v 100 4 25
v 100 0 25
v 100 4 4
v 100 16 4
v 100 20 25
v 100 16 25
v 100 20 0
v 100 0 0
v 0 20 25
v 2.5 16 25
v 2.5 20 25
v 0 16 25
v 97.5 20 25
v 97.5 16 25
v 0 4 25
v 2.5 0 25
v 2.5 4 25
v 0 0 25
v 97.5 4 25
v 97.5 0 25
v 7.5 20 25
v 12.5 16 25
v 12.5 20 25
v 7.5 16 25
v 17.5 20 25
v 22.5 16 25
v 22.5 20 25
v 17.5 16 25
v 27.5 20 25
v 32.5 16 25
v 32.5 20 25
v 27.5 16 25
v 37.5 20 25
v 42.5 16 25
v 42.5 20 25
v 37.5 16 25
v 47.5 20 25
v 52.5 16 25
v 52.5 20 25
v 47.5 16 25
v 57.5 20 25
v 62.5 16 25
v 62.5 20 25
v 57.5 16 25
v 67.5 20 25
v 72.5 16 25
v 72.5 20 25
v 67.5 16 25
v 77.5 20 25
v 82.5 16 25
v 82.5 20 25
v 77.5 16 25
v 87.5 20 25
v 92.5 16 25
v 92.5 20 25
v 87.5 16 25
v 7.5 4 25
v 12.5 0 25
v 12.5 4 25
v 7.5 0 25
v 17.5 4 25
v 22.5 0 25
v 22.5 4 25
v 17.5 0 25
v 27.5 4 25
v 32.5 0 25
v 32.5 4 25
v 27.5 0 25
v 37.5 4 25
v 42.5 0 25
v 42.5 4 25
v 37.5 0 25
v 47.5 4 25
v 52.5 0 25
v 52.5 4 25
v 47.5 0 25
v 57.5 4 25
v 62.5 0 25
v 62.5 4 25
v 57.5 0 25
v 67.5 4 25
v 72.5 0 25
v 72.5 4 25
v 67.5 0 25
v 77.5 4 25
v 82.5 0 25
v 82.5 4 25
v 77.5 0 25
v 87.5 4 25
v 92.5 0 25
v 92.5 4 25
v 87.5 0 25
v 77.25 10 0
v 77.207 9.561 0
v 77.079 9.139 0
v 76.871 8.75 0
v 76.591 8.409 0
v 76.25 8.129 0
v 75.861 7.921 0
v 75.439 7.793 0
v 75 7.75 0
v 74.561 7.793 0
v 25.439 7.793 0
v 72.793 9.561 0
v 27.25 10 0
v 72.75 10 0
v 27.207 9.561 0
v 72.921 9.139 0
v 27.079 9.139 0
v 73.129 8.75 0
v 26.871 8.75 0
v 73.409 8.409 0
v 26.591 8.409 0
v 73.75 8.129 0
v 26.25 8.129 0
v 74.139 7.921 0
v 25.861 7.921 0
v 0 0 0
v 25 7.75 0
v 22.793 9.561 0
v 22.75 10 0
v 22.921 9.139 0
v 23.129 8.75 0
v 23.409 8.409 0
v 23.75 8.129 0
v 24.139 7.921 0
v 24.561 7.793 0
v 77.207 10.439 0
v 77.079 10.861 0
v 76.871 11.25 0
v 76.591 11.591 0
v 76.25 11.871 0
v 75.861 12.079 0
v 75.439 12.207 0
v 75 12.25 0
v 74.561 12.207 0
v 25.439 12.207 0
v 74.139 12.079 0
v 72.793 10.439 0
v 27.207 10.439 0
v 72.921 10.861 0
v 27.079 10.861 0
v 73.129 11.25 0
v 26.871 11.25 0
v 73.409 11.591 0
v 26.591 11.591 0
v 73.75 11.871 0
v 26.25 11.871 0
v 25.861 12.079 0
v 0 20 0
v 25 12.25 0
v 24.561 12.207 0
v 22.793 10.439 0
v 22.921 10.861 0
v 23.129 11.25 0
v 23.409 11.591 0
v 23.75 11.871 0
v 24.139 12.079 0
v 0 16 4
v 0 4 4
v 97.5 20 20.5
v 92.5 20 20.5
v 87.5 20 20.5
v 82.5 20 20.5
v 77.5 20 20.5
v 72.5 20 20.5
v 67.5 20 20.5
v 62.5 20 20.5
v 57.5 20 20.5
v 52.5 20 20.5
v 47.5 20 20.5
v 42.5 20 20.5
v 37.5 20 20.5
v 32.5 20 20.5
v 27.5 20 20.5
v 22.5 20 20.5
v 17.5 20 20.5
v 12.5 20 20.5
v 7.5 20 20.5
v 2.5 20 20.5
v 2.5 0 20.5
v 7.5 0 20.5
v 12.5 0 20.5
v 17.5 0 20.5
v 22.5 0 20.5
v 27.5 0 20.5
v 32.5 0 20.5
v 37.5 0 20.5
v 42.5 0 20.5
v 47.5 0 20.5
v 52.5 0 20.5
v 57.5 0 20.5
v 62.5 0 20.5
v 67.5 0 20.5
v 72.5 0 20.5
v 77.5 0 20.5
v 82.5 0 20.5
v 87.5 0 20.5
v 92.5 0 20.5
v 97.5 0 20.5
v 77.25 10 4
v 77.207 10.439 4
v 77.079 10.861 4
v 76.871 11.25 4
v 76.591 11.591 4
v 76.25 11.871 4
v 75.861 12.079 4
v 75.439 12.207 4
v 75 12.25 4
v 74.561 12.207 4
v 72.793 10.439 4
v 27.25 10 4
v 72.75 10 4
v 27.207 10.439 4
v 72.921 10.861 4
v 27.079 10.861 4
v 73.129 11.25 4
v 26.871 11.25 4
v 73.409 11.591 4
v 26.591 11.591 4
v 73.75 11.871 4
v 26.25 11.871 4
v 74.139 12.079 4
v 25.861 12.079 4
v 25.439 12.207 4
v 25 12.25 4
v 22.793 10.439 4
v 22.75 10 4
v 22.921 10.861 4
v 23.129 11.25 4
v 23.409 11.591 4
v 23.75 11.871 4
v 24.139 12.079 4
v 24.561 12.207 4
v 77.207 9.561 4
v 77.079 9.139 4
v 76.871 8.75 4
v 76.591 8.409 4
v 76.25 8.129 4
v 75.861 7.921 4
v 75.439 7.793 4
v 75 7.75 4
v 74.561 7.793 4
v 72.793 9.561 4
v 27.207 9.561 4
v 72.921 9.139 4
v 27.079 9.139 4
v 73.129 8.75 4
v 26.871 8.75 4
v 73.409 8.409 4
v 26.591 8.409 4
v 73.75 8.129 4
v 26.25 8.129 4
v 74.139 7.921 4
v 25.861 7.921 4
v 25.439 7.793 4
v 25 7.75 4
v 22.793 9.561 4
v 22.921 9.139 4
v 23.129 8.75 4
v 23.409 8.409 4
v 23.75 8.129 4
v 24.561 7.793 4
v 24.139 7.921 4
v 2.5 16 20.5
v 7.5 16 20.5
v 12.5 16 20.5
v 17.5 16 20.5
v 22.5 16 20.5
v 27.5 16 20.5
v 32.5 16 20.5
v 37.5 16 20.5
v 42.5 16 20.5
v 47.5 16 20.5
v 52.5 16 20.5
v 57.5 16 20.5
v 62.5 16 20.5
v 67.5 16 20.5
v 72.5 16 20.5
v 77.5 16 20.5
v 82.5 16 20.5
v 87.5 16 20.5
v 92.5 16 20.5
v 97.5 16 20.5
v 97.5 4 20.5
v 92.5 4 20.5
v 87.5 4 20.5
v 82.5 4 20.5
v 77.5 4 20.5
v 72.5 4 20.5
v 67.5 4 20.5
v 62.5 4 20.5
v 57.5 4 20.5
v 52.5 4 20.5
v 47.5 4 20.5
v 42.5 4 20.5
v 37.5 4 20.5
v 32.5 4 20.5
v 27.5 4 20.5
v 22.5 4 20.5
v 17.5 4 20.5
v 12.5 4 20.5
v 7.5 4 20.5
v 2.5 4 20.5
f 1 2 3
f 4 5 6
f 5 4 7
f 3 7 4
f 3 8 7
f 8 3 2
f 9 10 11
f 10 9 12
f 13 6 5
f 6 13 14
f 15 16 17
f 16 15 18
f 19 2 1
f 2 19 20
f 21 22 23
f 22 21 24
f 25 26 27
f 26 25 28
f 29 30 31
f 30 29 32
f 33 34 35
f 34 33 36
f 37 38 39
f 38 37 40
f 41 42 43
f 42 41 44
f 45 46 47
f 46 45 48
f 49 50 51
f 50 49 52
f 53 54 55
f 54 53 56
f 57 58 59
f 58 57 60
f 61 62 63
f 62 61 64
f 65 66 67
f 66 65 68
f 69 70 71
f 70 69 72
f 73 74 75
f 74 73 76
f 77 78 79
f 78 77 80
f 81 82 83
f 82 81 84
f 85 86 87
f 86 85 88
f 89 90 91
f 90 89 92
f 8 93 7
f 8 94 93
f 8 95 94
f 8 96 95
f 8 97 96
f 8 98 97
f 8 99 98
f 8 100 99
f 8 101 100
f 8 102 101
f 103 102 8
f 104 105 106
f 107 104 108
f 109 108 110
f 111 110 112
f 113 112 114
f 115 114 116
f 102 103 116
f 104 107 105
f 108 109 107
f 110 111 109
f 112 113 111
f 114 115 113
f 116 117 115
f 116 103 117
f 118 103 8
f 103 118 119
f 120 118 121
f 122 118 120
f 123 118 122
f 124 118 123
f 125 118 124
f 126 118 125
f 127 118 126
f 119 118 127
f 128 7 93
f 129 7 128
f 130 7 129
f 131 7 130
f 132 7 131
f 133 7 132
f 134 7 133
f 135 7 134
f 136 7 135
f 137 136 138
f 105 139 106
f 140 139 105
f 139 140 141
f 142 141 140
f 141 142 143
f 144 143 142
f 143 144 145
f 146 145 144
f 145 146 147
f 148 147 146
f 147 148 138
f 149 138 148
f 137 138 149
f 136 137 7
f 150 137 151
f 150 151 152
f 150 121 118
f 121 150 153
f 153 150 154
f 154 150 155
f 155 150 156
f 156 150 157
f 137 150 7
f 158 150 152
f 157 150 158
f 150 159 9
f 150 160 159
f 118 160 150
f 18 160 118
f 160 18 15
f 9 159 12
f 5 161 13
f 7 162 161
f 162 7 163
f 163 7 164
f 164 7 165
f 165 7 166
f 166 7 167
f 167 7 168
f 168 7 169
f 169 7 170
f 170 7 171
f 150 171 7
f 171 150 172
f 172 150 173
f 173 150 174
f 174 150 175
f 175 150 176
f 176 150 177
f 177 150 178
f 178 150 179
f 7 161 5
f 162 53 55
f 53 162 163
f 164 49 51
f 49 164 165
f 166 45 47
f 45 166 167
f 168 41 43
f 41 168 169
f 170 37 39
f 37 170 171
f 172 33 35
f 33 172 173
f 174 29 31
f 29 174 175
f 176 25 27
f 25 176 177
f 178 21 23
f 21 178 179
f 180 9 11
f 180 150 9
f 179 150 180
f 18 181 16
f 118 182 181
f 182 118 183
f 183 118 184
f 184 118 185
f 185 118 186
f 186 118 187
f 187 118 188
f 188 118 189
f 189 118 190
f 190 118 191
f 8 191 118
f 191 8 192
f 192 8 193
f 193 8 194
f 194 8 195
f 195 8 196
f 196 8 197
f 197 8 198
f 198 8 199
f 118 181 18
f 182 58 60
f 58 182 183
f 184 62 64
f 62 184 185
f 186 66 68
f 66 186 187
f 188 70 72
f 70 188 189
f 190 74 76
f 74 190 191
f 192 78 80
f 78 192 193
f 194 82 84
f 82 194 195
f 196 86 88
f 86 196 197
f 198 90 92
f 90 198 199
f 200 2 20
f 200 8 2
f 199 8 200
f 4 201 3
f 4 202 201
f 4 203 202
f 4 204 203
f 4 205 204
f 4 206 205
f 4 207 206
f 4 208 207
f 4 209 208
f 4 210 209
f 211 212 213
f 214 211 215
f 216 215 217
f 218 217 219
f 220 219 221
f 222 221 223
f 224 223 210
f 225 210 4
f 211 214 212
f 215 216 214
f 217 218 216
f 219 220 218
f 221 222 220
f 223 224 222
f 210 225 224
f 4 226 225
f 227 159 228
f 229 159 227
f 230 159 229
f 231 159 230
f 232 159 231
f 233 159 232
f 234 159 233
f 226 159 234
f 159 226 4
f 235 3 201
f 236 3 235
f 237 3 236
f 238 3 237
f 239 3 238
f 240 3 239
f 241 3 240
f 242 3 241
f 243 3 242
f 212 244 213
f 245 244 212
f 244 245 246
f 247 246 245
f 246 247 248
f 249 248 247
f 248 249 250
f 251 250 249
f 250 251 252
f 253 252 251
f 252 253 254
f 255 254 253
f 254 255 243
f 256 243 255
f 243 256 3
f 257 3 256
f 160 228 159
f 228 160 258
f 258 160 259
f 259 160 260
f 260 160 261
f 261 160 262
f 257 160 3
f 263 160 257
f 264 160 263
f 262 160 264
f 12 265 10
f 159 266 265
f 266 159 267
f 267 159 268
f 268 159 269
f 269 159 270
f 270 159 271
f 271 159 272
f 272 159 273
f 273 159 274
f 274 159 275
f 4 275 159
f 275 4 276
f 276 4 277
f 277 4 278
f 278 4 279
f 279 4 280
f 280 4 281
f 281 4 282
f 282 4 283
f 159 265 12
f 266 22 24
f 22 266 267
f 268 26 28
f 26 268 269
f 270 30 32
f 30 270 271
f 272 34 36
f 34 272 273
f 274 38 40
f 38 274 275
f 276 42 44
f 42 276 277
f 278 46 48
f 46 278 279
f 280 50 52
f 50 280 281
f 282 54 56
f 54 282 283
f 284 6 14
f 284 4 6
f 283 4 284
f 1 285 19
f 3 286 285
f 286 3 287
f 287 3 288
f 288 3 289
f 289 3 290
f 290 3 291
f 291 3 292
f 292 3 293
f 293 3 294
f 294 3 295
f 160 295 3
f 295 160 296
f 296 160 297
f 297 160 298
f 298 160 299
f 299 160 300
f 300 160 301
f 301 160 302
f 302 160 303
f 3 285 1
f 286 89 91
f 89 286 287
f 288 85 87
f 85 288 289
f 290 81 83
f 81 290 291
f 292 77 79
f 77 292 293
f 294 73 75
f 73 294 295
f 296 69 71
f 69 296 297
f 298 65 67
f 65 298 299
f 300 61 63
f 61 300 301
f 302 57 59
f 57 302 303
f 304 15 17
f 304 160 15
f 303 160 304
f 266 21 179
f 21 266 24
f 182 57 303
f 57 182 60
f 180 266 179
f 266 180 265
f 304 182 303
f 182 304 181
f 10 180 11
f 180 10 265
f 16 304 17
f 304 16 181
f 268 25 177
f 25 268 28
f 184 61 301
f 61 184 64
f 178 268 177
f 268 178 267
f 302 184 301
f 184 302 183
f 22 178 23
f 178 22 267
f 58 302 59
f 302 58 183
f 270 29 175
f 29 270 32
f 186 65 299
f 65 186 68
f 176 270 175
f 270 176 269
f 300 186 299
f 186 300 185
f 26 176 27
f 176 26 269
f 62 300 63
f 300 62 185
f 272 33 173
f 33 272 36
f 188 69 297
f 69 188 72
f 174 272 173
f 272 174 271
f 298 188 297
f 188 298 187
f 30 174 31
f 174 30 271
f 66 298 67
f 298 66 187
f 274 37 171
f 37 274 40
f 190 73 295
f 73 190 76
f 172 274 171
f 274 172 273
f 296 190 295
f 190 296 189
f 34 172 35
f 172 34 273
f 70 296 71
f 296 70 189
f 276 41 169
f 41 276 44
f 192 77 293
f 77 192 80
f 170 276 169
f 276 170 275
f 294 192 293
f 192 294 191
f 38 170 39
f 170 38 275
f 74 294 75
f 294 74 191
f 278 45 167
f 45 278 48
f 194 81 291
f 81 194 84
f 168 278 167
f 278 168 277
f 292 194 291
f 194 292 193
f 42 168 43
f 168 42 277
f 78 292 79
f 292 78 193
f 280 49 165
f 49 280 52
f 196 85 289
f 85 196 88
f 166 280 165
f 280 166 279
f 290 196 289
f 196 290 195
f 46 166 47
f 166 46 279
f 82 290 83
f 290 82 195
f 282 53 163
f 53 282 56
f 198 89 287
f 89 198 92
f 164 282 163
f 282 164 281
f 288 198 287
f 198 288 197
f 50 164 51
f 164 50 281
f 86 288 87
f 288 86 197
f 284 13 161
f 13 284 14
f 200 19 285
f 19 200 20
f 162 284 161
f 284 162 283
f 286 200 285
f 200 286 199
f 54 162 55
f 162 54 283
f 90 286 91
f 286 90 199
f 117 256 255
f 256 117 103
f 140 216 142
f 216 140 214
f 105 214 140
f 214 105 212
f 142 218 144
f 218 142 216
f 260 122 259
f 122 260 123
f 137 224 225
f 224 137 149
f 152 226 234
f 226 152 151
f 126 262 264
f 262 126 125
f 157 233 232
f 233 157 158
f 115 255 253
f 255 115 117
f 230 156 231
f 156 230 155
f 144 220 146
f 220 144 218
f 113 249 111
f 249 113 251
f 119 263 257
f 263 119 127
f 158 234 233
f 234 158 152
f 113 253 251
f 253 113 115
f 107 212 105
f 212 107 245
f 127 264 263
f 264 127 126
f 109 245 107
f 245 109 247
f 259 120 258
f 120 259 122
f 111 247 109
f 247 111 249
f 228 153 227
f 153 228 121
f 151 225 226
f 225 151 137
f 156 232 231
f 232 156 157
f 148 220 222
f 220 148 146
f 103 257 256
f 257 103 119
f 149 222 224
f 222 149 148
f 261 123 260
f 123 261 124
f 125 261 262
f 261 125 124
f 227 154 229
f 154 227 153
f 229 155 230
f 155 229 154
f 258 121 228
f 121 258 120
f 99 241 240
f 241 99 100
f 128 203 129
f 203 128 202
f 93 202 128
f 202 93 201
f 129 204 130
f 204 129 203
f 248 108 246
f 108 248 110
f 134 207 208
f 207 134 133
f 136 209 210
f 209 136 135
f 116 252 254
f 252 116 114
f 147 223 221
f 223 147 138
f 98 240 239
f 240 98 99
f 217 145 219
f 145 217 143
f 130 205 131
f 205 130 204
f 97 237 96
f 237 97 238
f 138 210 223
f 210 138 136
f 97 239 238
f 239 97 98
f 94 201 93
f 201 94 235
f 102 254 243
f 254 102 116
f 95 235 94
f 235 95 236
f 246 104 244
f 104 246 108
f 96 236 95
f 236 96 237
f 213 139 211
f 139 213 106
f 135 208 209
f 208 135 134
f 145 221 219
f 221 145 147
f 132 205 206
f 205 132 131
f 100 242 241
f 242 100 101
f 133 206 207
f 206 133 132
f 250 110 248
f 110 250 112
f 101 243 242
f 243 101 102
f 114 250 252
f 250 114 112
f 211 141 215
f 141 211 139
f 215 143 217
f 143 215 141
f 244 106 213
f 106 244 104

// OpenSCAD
$fn = 32;

// ----------------------------------------------------------------------
// Cable duct: 100 x 20 x 25 mm, 10 fingers
// ----------------------------------------------------------------------

// --- parameters (mm) ---
channel_l = 100;          // duct length, X
channel_w = 20;           // duct width, Y
channel_h = 25;           // duct height, Z
channel_t = 4;            // side wall thickness
floor_t = 4;              // floor thickness
slot_w = 5;               // finger slot width
slot_h = 16.5;            // finger slot height
fingers = 10;             // number of finger slots per side
pitch = 10;               // finger pitch
hole_d = 4.5;             // floor mounting hole
hole_n = 2;               // mounting holes in the floor

module shell() {
  difference() {
    cube([channel_l, channel_w, channel_h]);
    /* open top channel */
    translate([-channel_t - 1, channel_t, floor_t])
      cube([channel_l + 2 * channel_t + 2, channel_w - 2 * channel_t, channel_h + 1]);
  }
}

difference() {
  union() {
    shell();
  }
  /* finger slots cut through both side walls */
  for (i = [0 : fingers - 1]) translate([pitch / 2 + i * pitch - slot_w / 2, -1, floor_t + slot_h]) cube([slot_w, channel_w + 2, channel_h]);
  for (i = [0 : hole_n - 1]) translate([(channel_l / hole_n) * (i + 0.5), channel_w / 2, -1]) cylinder(h = floor_t + 2, d = hole_d);
}
